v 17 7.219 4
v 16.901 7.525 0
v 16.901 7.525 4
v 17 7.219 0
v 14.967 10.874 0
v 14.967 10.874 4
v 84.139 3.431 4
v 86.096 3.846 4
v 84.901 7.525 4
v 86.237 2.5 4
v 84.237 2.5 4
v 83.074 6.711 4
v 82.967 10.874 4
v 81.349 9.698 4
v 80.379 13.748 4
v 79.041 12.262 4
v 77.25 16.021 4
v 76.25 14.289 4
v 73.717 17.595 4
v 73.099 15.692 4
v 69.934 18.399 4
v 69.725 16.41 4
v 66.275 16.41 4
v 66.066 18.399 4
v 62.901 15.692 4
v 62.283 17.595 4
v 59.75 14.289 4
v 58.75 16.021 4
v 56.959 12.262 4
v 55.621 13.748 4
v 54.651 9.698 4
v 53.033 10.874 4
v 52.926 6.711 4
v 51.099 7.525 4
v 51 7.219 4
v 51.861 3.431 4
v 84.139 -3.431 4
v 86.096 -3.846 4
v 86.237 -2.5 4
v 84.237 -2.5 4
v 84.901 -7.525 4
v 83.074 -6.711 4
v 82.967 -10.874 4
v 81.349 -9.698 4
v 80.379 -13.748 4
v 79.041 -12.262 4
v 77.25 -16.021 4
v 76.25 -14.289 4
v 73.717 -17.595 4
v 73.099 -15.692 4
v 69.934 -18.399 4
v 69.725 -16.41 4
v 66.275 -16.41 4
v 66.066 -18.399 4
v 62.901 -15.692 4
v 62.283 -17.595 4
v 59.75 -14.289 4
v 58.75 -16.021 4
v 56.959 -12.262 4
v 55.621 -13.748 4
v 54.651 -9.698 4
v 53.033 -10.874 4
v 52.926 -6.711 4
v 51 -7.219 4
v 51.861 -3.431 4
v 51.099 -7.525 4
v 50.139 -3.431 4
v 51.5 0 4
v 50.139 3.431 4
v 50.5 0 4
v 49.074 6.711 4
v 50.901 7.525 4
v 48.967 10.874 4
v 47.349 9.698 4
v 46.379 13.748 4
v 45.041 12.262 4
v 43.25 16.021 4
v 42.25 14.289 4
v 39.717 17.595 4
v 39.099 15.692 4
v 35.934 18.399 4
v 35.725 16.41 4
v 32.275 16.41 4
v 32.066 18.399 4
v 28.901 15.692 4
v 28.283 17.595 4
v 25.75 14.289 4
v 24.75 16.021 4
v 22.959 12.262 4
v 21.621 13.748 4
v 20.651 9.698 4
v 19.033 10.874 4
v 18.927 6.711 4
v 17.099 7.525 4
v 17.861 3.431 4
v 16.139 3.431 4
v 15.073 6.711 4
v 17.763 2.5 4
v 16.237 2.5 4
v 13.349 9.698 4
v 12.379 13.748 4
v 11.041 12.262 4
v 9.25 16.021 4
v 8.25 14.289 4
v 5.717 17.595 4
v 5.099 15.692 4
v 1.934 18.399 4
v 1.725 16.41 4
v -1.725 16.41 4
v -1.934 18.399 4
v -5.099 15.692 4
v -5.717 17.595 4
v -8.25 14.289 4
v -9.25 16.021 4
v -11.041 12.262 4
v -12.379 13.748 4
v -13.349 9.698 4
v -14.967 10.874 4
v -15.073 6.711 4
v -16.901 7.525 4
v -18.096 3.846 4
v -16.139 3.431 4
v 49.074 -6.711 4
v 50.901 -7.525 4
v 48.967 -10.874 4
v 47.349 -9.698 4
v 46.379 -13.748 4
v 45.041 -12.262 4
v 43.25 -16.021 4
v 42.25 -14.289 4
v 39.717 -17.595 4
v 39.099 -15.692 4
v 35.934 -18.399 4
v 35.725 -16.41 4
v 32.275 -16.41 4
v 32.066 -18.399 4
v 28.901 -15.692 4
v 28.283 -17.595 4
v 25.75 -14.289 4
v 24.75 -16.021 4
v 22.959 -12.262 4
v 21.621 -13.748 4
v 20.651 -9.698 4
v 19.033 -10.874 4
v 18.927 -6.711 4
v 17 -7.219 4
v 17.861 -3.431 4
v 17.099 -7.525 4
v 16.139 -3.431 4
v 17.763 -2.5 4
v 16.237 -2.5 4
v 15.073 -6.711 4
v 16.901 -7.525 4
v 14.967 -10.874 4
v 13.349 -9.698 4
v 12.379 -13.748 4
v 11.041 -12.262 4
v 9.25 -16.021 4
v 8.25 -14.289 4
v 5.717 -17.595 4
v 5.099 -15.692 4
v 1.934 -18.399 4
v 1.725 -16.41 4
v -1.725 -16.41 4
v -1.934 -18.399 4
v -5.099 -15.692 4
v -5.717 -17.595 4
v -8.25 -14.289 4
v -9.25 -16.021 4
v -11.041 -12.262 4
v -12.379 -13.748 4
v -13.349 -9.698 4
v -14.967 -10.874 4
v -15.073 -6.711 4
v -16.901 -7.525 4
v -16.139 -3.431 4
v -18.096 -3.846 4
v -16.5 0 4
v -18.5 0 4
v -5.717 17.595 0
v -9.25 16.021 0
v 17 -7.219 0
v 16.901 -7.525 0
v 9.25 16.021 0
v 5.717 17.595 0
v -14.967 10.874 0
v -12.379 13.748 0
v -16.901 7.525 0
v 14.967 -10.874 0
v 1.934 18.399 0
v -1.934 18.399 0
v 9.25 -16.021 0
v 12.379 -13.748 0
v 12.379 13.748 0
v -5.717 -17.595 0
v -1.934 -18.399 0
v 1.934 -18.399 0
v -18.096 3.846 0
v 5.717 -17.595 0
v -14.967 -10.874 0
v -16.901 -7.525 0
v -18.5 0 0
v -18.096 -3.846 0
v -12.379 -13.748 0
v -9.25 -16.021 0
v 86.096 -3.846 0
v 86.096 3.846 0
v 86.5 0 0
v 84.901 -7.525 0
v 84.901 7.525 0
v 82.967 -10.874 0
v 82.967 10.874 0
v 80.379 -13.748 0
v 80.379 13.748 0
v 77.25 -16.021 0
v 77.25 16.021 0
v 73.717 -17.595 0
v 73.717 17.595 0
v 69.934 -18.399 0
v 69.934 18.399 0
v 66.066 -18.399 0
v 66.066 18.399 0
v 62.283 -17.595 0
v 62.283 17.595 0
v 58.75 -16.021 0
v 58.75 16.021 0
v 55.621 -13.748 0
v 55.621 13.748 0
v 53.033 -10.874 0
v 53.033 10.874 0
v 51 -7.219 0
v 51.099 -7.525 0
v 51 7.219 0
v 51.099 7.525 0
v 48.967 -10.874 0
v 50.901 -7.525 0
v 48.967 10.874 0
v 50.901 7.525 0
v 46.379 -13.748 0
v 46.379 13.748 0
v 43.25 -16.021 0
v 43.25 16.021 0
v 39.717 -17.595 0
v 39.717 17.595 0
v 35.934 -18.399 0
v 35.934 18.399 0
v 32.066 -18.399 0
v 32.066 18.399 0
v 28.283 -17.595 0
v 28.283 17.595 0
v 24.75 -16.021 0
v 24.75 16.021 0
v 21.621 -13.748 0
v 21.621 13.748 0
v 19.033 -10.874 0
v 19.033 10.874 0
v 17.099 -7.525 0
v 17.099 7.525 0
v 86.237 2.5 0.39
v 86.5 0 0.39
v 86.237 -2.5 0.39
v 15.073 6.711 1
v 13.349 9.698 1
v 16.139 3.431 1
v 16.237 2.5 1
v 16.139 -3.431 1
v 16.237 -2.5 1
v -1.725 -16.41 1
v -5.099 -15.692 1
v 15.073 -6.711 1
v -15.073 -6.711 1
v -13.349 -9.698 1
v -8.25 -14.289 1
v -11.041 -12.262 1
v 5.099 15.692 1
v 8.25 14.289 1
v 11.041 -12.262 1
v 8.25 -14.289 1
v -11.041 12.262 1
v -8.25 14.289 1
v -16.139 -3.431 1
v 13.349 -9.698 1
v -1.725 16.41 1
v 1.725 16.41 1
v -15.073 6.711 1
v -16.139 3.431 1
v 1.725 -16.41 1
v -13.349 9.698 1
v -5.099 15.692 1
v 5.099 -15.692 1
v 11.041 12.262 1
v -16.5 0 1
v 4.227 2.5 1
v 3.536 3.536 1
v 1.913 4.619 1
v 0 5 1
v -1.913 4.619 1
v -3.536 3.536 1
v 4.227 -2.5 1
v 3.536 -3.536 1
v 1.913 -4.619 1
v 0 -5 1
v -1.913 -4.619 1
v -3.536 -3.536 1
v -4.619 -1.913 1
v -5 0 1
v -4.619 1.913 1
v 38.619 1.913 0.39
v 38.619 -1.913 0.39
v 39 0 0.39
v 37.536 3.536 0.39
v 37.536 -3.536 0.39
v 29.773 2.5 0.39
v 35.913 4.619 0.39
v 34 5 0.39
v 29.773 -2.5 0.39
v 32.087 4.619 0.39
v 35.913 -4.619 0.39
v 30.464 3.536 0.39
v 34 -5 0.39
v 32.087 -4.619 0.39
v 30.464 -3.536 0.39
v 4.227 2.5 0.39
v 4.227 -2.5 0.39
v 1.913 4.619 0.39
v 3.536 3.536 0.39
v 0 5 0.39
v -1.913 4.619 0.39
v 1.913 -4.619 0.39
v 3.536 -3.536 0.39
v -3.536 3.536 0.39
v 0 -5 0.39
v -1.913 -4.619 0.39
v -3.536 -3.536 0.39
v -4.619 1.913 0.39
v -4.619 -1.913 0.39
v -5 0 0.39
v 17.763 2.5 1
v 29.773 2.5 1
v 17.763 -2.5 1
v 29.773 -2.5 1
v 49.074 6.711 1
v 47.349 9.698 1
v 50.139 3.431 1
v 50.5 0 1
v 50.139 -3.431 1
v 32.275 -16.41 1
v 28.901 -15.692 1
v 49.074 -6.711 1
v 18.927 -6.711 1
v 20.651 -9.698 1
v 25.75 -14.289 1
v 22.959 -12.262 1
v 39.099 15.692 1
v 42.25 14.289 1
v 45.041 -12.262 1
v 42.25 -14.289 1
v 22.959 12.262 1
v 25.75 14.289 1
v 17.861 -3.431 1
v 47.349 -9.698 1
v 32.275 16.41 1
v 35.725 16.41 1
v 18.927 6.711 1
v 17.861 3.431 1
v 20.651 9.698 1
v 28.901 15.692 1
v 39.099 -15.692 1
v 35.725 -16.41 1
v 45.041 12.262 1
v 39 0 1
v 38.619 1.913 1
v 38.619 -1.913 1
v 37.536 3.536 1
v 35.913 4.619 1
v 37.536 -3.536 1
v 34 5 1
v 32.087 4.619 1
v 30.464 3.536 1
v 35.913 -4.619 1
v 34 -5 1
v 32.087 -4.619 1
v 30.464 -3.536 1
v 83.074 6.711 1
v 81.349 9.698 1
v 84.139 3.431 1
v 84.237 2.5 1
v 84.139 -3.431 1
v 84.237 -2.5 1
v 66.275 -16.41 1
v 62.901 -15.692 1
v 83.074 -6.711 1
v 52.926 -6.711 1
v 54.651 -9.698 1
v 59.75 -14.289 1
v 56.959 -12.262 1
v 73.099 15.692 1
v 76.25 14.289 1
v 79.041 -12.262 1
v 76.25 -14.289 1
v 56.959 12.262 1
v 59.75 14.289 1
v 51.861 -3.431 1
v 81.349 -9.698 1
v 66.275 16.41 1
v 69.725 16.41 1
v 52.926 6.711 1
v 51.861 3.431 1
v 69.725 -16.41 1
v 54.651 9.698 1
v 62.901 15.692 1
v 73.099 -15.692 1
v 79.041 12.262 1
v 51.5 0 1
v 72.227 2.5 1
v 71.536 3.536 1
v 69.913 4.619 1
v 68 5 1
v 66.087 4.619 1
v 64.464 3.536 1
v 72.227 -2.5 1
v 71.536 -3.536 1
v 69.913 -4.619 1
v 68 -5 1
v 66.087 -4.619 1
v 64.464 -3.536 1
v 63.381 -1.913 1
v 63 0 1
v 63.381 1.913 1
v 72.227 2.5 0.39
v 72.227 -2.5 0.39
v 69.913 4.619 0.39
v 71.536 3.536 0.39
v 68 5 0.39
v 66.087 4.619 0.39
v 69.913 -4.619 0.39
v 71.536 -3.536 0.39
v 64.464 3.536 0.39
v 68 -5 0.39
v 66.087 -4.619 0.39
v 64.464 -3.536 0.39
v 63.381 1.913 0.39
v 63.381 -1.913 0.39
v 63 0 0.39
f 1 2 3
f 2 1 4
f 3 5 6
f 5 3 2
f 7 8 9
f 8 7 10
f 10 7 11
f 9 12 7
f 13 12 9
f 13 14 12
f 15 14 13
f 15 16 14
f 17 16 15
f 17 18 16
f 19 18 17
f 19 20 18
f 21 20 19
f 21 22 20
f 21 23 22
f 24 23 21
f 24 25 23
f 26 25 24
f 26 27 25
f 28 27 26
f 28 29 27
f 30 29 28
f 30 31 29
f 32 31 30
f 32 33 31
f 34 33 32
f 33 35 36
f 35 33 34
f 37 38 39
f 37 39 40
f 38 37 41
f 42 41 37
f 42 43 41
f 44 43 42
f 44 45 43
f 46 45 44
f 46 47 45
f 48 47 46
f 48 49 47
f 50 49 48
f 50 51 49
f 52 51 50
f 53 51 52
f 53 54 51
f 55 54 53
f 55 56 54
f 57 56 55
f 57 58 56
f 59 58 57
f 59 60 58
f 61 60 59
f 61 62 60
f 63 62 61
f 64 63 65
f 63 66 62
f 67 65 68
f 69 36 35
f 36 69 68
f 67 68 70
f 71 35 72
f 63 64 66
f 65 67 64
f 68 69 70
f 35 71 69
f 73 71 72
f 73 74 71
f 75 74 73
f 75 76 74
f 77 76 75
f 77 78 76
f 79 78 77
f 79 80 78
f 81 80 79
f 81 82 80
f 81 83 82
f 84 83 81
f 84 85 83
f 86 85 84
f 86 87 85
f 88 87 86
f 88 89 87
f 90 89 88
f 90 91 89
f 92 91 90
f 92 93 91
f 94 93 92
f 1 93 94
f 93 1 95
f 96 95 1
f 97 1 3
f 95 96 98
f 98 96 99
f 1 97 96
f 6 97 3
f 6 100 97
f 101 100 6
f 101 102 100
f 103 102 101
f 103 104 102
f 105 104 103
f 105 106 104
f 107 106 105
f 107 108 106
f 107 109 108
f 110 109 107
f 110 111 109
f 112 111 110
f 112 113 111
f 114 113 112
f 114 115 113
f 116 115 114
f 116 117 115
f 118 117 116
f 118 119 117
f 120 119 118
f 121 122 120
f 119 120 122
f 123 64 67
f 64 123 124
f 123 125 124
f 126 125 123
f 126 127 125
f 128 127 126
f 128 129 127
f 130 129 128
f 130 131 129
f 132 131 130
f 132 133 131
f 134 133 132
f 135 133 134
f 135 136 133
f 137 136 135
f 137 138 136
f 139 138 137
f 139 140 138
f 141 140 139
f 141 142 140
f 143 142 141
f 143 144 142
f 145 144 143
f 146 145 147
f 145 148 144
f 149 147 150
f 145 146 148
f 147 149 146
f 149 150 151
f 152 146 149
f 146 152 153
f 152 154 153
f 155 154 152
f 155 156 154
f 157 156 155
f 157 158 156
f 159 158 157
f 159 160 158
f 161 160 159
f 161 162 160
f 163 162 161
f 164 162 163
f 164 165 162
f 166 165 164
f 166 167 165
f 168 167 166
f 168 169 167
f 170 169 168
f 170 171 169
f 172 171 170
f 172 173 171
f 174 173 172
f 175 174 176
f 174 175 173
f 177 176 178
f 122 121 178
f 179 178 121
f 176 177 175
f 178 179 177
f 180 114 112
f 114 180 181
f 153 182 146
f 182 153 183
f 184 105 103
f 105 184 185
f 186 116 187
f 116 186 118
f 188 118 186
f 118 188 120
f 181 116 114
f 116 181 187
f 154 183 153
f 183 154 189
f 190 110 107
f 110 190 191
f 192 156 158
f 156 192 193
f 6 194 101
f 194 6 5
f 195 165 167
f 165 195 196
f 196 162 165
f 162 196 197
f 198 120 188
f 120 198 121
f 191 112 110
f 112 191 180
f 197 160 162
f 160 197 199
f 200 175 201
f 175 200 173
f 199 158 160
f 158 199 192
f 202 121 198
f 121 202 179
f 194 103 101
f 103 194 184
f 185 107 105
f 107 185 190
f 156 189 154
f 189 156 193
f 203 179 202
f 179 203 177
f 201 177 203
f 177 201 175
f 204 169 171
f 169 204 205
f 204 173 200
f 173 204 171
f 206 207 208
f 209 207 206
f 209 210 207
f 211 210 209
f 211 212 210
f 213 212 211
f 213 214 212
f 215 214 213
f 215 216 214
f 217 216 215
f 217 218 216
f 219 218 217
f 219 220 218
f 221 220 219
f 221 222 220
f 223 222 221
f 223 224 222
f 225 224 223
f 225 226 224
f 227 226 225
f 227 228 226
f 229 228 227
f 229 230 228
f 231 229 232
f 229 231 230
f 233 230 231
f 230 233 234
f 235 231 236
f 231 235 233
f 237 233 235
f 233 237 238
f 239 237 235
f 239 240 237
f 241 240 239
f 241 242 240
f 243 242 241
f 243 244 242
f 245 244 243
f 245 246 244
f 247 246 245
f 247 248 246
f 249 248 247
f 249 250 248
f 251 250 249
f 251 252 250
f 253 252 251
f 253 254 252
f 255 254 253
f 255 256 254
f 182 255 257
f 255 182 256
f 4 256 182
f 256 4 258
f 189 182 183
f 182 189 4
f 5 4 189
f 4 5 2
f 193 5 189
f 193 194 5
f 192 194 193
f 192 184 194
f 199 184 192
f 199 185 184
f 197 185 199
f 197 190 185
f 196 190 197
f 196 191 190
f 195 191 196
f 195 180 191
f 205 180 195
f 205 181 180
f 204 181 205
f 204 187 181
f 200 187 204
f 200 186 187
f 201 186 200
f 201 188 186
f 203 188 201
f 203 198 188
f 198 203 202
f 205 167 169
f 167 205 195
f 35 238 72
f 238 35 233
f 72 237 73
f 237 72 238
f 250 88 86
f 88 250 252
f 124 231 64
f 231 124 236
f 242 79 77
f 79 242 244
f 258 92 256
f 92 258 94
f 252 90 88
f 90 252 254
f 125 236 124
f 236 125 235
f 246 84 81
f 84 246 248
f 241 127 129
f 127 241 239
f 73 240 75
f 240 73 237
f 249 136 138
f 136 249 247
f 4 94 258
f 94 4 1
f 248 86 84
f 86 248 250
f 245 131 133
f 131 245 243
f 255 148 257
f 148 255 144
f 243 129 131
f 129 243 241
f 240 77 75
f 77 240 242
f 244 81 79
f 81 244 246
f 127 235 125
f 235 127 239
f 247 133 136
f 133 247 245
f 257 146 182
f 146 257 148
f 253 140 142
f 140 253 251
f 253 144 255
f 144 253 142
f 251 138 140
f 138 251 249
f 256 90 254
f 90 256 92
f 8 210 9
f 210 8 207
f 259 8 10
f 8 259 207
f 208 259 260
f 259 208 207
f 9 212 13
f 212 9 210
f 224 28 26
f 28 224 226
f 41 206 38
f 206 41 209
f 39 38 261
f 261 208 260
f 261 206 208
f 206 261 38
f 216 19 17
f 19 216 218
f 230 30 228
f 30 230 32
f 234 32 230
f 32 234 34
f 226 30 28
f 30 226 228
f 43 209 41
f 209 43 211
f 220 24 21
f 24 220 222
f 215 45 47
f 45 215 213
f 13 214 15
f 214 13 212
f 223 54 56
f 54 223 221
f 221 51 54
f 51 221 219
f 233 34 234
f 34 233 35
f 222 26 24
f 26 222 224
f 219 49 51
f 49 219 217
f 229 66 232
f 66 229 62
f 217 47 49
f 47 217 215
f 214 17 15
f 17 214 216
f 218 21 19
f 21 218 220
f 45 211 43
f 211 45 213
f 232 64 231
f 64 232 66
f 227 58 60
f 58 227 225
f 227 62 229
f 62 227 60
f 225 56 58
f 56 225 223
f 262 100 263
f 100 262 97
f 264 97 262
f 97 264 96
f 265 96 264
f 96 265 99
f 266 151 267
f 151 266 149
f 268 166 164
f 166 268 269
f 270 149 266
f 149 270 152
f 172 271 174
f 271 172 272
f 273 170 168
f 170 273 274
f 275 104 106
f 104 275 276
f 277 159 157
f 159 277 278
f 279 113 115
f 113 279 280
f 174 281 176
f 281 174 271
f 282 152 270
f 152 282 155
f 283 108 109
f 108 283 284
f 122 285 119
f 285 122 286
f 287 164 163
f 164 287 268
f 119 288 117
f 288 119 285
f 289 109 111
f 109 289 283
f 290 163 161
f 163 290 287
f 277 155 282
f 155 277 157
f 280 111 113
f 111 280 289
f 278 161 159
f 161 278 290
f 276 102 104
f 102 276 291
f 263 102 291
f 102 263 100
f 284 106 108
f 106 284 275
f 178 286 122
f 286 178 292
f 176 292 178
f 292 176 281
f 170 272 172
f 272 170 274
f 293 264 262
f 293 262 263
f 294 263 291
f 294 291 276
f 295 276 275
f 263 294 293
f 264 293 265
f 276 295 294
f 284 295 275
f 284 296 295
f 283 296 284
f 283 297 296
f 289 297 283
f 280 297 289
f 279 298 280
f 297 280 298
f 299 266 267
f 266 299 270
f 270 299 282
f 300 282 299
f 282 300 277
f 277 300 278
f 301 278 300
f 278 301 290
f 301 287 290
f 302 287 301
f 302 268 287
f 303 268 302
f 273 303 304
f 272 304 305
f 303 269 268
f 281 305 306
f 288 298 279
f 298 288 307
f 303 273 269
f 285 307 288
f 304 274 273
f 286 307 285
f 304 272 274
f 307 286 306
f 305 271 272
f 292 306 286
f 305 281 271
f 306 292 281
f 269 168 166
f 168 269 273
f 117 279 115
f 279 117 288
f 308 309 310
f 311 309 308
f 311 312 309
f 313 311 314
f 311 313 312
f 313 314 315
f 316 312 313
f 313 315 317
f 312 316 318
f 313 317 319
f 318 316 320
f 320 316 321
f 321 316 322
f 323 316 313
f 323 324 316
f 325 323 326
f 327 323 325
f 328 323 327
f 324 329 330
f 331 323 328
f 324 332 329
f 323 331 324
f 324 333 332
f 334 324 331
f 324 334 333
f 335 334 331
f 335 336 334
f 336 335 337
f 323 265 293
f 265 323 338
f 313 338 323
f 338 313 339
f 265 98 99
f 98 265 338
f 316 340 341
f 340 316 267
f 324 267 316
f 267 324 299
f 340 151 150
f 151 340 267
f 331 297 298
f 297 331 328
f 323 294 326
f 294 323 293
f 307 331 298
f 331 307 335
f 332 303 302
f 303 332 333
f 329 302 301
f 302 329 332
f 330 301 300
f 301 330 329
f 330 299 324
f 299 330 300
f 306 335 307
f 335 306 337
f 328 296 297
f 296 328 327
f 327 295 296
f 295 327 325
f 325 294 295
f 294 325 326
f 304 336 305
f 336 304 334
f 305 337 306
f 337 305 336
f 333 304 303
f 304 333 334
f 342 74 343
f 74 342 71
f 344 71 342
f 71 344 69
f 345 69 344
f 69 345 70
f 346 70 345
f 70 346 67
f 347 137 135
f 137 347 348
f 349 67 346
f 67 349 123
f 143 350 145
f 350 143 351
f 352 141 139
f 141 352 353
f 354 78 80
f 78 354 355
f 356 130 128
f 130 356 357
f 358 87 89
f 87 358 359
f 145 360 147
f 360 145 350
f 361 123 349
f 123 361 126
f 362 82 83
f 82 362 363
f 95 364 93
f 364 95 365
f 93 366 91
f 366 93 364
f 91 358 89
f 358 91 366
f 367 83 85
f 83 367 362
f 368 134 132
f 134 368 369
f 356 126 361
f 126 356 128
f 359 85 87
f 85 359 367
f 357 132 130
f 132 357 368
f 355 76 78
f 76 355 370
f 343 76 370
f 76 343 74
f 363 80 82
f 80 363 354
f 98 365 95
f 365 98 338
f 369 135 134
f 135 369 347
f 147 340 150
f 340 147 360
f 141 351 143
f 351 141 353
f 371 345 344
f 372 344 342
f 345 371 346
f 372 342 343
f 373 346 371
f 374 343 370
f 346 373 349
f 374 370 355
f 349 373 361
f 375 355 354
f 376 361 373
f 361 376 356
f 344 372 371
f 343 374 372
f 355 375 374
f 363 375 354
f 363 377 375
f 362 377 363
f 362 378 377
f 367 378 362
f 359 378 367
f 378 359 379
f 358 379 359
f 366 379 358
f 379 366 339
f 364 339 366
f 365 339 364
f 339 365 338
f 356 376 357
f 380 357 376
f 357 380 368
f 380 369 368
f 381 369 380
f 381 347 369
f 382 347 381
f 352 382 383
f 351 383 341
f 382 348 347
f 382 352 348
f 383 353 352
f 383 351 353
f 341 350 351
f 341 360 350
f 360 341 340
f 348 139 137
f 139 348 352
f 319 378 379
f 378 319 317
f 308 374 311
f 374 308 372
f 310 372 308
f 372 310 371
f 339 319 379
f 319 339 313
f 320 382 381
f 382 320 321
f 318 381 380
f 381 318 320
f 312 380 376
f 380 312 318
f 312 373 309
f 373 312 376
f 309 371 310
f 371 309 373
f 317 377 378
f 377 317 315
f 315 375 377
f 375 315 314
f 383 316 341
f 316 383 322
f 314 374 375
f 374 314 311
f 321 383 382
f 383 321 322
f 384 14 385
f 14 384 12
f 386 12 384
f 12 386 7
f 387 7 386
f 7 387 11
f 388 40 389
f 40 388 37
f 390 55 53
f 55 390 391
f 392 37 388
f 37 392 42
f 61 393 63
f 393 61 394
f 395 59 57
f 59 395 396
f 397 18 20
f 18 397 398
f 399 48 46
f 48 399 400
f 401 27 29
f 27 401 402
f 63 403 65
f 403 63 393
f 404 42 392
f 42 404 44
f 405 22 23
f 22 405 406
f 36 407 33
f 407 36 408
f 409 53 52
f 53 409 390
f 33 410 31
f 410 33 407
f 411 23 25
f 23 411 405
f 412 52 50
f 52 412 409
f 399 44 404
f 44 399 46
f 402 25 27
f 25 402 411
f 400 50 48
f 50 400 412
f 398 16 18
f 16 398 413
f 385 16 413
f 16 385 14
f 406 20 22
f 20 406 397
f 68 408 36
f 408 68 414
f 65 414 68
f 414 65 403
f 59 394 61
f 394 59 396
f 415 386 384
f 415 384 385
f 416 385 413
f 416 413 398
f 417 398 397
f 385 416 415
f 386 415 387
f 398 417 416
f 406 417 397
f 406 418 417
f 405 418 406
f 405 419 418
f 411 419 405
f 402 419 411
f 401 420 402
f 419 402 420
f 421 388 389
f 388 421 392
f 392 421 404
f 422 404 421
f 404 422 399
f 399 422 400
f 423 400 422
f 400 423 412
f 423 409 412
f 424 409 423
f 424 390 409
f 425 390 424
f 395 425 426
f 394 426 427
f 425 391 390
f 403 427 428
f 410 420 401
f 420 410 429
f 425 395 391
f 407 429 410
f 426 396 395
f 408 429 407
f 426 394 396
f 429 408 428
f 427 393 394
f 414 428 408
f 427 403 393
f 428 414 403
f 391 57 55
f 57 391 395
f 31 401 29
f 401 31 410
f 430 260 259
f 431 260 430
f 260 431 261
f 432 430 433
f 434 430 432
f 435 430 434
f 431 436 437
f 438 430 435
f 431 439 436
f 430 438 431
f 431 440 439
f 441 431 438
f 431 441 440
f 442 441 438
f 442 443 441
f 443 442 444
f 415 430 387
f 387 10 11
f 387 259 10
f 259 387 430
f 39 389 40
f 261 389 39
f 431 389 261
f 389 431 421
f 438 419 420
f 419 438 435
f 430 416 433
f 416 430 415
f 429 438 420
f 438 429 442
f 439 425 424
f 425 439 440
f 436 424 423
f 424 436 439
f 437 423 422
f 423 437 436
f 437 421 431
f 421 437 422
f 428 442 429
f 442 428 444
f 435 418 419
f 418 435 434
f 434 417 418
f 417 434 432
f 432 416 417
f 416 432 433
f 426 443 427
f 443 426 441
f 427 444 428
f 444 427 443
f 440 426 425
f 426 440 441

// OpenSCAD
// cell diameter
cell_d=33; // [5:0.5:50]

// cell height
cell_h=72; // [5:0.5:100]

// extra space between cells
spacer=1; // [ 0.4:0.2:5]

// ring width
ring_w=2; // [0.4:0.2:5]

// height of ring edge
ring_h=3; // [0.4:0.2:10]

// bottom?
ring_b=1; // [0.4:0.2:10]

// tap width
tap_w=5; // [1:0.5:20]

// tap depth
tap_d=0.6; // [0:0.2:10]

// tap circle
tap_c=10; // [5:1:45]

// #cells
num=3; // [1:99]

// open at start?
open=false;

/* [Hidden] */
_d=0.01;

module batt_p(rot=false) {
    cylinder(h=ring_h+ring_b, d=cell_d+ring_w*2);
    rotate(rot?180:0) translate([0,-(tap_w+2*ring_w)/2,0]) cube([cell_d/2+spacer/2+_d,tap_w+2*ring_w,ring_h+ring_b],center=false);
}
module batt_n(rot=false) {
    translate([0,0,ring_b]) cylinder(h=ring_h+_d,d=cell_d);
    rotate(rot?180:0) translate([0,-(tap_w)/2,ring_b-tap_d-_d]) cube([cell_d/2+spacer*2+_d,tap_w,ring_h+tap_d+2*_d],center=false);
    translate([0,0,ring_b-tap_d-_d]) cylinder(h=ring_h+ring_b,d=tap_c);
}

module arr_p() {
    for(x=[0:num-1]) {
        translate([x*(cell_d+spacer),0,0]) batt_p(!(x%2)==open);
    }
}
module arr_n() {
    for(x=[0:num-1]) {
        translate([x*(cell_d+spacer),0,0]) batt_n(!(x%2)==open);
    }
}
module holder() {
    difference() {
        arr_p();
        arr_n();
    }
}
holder();
